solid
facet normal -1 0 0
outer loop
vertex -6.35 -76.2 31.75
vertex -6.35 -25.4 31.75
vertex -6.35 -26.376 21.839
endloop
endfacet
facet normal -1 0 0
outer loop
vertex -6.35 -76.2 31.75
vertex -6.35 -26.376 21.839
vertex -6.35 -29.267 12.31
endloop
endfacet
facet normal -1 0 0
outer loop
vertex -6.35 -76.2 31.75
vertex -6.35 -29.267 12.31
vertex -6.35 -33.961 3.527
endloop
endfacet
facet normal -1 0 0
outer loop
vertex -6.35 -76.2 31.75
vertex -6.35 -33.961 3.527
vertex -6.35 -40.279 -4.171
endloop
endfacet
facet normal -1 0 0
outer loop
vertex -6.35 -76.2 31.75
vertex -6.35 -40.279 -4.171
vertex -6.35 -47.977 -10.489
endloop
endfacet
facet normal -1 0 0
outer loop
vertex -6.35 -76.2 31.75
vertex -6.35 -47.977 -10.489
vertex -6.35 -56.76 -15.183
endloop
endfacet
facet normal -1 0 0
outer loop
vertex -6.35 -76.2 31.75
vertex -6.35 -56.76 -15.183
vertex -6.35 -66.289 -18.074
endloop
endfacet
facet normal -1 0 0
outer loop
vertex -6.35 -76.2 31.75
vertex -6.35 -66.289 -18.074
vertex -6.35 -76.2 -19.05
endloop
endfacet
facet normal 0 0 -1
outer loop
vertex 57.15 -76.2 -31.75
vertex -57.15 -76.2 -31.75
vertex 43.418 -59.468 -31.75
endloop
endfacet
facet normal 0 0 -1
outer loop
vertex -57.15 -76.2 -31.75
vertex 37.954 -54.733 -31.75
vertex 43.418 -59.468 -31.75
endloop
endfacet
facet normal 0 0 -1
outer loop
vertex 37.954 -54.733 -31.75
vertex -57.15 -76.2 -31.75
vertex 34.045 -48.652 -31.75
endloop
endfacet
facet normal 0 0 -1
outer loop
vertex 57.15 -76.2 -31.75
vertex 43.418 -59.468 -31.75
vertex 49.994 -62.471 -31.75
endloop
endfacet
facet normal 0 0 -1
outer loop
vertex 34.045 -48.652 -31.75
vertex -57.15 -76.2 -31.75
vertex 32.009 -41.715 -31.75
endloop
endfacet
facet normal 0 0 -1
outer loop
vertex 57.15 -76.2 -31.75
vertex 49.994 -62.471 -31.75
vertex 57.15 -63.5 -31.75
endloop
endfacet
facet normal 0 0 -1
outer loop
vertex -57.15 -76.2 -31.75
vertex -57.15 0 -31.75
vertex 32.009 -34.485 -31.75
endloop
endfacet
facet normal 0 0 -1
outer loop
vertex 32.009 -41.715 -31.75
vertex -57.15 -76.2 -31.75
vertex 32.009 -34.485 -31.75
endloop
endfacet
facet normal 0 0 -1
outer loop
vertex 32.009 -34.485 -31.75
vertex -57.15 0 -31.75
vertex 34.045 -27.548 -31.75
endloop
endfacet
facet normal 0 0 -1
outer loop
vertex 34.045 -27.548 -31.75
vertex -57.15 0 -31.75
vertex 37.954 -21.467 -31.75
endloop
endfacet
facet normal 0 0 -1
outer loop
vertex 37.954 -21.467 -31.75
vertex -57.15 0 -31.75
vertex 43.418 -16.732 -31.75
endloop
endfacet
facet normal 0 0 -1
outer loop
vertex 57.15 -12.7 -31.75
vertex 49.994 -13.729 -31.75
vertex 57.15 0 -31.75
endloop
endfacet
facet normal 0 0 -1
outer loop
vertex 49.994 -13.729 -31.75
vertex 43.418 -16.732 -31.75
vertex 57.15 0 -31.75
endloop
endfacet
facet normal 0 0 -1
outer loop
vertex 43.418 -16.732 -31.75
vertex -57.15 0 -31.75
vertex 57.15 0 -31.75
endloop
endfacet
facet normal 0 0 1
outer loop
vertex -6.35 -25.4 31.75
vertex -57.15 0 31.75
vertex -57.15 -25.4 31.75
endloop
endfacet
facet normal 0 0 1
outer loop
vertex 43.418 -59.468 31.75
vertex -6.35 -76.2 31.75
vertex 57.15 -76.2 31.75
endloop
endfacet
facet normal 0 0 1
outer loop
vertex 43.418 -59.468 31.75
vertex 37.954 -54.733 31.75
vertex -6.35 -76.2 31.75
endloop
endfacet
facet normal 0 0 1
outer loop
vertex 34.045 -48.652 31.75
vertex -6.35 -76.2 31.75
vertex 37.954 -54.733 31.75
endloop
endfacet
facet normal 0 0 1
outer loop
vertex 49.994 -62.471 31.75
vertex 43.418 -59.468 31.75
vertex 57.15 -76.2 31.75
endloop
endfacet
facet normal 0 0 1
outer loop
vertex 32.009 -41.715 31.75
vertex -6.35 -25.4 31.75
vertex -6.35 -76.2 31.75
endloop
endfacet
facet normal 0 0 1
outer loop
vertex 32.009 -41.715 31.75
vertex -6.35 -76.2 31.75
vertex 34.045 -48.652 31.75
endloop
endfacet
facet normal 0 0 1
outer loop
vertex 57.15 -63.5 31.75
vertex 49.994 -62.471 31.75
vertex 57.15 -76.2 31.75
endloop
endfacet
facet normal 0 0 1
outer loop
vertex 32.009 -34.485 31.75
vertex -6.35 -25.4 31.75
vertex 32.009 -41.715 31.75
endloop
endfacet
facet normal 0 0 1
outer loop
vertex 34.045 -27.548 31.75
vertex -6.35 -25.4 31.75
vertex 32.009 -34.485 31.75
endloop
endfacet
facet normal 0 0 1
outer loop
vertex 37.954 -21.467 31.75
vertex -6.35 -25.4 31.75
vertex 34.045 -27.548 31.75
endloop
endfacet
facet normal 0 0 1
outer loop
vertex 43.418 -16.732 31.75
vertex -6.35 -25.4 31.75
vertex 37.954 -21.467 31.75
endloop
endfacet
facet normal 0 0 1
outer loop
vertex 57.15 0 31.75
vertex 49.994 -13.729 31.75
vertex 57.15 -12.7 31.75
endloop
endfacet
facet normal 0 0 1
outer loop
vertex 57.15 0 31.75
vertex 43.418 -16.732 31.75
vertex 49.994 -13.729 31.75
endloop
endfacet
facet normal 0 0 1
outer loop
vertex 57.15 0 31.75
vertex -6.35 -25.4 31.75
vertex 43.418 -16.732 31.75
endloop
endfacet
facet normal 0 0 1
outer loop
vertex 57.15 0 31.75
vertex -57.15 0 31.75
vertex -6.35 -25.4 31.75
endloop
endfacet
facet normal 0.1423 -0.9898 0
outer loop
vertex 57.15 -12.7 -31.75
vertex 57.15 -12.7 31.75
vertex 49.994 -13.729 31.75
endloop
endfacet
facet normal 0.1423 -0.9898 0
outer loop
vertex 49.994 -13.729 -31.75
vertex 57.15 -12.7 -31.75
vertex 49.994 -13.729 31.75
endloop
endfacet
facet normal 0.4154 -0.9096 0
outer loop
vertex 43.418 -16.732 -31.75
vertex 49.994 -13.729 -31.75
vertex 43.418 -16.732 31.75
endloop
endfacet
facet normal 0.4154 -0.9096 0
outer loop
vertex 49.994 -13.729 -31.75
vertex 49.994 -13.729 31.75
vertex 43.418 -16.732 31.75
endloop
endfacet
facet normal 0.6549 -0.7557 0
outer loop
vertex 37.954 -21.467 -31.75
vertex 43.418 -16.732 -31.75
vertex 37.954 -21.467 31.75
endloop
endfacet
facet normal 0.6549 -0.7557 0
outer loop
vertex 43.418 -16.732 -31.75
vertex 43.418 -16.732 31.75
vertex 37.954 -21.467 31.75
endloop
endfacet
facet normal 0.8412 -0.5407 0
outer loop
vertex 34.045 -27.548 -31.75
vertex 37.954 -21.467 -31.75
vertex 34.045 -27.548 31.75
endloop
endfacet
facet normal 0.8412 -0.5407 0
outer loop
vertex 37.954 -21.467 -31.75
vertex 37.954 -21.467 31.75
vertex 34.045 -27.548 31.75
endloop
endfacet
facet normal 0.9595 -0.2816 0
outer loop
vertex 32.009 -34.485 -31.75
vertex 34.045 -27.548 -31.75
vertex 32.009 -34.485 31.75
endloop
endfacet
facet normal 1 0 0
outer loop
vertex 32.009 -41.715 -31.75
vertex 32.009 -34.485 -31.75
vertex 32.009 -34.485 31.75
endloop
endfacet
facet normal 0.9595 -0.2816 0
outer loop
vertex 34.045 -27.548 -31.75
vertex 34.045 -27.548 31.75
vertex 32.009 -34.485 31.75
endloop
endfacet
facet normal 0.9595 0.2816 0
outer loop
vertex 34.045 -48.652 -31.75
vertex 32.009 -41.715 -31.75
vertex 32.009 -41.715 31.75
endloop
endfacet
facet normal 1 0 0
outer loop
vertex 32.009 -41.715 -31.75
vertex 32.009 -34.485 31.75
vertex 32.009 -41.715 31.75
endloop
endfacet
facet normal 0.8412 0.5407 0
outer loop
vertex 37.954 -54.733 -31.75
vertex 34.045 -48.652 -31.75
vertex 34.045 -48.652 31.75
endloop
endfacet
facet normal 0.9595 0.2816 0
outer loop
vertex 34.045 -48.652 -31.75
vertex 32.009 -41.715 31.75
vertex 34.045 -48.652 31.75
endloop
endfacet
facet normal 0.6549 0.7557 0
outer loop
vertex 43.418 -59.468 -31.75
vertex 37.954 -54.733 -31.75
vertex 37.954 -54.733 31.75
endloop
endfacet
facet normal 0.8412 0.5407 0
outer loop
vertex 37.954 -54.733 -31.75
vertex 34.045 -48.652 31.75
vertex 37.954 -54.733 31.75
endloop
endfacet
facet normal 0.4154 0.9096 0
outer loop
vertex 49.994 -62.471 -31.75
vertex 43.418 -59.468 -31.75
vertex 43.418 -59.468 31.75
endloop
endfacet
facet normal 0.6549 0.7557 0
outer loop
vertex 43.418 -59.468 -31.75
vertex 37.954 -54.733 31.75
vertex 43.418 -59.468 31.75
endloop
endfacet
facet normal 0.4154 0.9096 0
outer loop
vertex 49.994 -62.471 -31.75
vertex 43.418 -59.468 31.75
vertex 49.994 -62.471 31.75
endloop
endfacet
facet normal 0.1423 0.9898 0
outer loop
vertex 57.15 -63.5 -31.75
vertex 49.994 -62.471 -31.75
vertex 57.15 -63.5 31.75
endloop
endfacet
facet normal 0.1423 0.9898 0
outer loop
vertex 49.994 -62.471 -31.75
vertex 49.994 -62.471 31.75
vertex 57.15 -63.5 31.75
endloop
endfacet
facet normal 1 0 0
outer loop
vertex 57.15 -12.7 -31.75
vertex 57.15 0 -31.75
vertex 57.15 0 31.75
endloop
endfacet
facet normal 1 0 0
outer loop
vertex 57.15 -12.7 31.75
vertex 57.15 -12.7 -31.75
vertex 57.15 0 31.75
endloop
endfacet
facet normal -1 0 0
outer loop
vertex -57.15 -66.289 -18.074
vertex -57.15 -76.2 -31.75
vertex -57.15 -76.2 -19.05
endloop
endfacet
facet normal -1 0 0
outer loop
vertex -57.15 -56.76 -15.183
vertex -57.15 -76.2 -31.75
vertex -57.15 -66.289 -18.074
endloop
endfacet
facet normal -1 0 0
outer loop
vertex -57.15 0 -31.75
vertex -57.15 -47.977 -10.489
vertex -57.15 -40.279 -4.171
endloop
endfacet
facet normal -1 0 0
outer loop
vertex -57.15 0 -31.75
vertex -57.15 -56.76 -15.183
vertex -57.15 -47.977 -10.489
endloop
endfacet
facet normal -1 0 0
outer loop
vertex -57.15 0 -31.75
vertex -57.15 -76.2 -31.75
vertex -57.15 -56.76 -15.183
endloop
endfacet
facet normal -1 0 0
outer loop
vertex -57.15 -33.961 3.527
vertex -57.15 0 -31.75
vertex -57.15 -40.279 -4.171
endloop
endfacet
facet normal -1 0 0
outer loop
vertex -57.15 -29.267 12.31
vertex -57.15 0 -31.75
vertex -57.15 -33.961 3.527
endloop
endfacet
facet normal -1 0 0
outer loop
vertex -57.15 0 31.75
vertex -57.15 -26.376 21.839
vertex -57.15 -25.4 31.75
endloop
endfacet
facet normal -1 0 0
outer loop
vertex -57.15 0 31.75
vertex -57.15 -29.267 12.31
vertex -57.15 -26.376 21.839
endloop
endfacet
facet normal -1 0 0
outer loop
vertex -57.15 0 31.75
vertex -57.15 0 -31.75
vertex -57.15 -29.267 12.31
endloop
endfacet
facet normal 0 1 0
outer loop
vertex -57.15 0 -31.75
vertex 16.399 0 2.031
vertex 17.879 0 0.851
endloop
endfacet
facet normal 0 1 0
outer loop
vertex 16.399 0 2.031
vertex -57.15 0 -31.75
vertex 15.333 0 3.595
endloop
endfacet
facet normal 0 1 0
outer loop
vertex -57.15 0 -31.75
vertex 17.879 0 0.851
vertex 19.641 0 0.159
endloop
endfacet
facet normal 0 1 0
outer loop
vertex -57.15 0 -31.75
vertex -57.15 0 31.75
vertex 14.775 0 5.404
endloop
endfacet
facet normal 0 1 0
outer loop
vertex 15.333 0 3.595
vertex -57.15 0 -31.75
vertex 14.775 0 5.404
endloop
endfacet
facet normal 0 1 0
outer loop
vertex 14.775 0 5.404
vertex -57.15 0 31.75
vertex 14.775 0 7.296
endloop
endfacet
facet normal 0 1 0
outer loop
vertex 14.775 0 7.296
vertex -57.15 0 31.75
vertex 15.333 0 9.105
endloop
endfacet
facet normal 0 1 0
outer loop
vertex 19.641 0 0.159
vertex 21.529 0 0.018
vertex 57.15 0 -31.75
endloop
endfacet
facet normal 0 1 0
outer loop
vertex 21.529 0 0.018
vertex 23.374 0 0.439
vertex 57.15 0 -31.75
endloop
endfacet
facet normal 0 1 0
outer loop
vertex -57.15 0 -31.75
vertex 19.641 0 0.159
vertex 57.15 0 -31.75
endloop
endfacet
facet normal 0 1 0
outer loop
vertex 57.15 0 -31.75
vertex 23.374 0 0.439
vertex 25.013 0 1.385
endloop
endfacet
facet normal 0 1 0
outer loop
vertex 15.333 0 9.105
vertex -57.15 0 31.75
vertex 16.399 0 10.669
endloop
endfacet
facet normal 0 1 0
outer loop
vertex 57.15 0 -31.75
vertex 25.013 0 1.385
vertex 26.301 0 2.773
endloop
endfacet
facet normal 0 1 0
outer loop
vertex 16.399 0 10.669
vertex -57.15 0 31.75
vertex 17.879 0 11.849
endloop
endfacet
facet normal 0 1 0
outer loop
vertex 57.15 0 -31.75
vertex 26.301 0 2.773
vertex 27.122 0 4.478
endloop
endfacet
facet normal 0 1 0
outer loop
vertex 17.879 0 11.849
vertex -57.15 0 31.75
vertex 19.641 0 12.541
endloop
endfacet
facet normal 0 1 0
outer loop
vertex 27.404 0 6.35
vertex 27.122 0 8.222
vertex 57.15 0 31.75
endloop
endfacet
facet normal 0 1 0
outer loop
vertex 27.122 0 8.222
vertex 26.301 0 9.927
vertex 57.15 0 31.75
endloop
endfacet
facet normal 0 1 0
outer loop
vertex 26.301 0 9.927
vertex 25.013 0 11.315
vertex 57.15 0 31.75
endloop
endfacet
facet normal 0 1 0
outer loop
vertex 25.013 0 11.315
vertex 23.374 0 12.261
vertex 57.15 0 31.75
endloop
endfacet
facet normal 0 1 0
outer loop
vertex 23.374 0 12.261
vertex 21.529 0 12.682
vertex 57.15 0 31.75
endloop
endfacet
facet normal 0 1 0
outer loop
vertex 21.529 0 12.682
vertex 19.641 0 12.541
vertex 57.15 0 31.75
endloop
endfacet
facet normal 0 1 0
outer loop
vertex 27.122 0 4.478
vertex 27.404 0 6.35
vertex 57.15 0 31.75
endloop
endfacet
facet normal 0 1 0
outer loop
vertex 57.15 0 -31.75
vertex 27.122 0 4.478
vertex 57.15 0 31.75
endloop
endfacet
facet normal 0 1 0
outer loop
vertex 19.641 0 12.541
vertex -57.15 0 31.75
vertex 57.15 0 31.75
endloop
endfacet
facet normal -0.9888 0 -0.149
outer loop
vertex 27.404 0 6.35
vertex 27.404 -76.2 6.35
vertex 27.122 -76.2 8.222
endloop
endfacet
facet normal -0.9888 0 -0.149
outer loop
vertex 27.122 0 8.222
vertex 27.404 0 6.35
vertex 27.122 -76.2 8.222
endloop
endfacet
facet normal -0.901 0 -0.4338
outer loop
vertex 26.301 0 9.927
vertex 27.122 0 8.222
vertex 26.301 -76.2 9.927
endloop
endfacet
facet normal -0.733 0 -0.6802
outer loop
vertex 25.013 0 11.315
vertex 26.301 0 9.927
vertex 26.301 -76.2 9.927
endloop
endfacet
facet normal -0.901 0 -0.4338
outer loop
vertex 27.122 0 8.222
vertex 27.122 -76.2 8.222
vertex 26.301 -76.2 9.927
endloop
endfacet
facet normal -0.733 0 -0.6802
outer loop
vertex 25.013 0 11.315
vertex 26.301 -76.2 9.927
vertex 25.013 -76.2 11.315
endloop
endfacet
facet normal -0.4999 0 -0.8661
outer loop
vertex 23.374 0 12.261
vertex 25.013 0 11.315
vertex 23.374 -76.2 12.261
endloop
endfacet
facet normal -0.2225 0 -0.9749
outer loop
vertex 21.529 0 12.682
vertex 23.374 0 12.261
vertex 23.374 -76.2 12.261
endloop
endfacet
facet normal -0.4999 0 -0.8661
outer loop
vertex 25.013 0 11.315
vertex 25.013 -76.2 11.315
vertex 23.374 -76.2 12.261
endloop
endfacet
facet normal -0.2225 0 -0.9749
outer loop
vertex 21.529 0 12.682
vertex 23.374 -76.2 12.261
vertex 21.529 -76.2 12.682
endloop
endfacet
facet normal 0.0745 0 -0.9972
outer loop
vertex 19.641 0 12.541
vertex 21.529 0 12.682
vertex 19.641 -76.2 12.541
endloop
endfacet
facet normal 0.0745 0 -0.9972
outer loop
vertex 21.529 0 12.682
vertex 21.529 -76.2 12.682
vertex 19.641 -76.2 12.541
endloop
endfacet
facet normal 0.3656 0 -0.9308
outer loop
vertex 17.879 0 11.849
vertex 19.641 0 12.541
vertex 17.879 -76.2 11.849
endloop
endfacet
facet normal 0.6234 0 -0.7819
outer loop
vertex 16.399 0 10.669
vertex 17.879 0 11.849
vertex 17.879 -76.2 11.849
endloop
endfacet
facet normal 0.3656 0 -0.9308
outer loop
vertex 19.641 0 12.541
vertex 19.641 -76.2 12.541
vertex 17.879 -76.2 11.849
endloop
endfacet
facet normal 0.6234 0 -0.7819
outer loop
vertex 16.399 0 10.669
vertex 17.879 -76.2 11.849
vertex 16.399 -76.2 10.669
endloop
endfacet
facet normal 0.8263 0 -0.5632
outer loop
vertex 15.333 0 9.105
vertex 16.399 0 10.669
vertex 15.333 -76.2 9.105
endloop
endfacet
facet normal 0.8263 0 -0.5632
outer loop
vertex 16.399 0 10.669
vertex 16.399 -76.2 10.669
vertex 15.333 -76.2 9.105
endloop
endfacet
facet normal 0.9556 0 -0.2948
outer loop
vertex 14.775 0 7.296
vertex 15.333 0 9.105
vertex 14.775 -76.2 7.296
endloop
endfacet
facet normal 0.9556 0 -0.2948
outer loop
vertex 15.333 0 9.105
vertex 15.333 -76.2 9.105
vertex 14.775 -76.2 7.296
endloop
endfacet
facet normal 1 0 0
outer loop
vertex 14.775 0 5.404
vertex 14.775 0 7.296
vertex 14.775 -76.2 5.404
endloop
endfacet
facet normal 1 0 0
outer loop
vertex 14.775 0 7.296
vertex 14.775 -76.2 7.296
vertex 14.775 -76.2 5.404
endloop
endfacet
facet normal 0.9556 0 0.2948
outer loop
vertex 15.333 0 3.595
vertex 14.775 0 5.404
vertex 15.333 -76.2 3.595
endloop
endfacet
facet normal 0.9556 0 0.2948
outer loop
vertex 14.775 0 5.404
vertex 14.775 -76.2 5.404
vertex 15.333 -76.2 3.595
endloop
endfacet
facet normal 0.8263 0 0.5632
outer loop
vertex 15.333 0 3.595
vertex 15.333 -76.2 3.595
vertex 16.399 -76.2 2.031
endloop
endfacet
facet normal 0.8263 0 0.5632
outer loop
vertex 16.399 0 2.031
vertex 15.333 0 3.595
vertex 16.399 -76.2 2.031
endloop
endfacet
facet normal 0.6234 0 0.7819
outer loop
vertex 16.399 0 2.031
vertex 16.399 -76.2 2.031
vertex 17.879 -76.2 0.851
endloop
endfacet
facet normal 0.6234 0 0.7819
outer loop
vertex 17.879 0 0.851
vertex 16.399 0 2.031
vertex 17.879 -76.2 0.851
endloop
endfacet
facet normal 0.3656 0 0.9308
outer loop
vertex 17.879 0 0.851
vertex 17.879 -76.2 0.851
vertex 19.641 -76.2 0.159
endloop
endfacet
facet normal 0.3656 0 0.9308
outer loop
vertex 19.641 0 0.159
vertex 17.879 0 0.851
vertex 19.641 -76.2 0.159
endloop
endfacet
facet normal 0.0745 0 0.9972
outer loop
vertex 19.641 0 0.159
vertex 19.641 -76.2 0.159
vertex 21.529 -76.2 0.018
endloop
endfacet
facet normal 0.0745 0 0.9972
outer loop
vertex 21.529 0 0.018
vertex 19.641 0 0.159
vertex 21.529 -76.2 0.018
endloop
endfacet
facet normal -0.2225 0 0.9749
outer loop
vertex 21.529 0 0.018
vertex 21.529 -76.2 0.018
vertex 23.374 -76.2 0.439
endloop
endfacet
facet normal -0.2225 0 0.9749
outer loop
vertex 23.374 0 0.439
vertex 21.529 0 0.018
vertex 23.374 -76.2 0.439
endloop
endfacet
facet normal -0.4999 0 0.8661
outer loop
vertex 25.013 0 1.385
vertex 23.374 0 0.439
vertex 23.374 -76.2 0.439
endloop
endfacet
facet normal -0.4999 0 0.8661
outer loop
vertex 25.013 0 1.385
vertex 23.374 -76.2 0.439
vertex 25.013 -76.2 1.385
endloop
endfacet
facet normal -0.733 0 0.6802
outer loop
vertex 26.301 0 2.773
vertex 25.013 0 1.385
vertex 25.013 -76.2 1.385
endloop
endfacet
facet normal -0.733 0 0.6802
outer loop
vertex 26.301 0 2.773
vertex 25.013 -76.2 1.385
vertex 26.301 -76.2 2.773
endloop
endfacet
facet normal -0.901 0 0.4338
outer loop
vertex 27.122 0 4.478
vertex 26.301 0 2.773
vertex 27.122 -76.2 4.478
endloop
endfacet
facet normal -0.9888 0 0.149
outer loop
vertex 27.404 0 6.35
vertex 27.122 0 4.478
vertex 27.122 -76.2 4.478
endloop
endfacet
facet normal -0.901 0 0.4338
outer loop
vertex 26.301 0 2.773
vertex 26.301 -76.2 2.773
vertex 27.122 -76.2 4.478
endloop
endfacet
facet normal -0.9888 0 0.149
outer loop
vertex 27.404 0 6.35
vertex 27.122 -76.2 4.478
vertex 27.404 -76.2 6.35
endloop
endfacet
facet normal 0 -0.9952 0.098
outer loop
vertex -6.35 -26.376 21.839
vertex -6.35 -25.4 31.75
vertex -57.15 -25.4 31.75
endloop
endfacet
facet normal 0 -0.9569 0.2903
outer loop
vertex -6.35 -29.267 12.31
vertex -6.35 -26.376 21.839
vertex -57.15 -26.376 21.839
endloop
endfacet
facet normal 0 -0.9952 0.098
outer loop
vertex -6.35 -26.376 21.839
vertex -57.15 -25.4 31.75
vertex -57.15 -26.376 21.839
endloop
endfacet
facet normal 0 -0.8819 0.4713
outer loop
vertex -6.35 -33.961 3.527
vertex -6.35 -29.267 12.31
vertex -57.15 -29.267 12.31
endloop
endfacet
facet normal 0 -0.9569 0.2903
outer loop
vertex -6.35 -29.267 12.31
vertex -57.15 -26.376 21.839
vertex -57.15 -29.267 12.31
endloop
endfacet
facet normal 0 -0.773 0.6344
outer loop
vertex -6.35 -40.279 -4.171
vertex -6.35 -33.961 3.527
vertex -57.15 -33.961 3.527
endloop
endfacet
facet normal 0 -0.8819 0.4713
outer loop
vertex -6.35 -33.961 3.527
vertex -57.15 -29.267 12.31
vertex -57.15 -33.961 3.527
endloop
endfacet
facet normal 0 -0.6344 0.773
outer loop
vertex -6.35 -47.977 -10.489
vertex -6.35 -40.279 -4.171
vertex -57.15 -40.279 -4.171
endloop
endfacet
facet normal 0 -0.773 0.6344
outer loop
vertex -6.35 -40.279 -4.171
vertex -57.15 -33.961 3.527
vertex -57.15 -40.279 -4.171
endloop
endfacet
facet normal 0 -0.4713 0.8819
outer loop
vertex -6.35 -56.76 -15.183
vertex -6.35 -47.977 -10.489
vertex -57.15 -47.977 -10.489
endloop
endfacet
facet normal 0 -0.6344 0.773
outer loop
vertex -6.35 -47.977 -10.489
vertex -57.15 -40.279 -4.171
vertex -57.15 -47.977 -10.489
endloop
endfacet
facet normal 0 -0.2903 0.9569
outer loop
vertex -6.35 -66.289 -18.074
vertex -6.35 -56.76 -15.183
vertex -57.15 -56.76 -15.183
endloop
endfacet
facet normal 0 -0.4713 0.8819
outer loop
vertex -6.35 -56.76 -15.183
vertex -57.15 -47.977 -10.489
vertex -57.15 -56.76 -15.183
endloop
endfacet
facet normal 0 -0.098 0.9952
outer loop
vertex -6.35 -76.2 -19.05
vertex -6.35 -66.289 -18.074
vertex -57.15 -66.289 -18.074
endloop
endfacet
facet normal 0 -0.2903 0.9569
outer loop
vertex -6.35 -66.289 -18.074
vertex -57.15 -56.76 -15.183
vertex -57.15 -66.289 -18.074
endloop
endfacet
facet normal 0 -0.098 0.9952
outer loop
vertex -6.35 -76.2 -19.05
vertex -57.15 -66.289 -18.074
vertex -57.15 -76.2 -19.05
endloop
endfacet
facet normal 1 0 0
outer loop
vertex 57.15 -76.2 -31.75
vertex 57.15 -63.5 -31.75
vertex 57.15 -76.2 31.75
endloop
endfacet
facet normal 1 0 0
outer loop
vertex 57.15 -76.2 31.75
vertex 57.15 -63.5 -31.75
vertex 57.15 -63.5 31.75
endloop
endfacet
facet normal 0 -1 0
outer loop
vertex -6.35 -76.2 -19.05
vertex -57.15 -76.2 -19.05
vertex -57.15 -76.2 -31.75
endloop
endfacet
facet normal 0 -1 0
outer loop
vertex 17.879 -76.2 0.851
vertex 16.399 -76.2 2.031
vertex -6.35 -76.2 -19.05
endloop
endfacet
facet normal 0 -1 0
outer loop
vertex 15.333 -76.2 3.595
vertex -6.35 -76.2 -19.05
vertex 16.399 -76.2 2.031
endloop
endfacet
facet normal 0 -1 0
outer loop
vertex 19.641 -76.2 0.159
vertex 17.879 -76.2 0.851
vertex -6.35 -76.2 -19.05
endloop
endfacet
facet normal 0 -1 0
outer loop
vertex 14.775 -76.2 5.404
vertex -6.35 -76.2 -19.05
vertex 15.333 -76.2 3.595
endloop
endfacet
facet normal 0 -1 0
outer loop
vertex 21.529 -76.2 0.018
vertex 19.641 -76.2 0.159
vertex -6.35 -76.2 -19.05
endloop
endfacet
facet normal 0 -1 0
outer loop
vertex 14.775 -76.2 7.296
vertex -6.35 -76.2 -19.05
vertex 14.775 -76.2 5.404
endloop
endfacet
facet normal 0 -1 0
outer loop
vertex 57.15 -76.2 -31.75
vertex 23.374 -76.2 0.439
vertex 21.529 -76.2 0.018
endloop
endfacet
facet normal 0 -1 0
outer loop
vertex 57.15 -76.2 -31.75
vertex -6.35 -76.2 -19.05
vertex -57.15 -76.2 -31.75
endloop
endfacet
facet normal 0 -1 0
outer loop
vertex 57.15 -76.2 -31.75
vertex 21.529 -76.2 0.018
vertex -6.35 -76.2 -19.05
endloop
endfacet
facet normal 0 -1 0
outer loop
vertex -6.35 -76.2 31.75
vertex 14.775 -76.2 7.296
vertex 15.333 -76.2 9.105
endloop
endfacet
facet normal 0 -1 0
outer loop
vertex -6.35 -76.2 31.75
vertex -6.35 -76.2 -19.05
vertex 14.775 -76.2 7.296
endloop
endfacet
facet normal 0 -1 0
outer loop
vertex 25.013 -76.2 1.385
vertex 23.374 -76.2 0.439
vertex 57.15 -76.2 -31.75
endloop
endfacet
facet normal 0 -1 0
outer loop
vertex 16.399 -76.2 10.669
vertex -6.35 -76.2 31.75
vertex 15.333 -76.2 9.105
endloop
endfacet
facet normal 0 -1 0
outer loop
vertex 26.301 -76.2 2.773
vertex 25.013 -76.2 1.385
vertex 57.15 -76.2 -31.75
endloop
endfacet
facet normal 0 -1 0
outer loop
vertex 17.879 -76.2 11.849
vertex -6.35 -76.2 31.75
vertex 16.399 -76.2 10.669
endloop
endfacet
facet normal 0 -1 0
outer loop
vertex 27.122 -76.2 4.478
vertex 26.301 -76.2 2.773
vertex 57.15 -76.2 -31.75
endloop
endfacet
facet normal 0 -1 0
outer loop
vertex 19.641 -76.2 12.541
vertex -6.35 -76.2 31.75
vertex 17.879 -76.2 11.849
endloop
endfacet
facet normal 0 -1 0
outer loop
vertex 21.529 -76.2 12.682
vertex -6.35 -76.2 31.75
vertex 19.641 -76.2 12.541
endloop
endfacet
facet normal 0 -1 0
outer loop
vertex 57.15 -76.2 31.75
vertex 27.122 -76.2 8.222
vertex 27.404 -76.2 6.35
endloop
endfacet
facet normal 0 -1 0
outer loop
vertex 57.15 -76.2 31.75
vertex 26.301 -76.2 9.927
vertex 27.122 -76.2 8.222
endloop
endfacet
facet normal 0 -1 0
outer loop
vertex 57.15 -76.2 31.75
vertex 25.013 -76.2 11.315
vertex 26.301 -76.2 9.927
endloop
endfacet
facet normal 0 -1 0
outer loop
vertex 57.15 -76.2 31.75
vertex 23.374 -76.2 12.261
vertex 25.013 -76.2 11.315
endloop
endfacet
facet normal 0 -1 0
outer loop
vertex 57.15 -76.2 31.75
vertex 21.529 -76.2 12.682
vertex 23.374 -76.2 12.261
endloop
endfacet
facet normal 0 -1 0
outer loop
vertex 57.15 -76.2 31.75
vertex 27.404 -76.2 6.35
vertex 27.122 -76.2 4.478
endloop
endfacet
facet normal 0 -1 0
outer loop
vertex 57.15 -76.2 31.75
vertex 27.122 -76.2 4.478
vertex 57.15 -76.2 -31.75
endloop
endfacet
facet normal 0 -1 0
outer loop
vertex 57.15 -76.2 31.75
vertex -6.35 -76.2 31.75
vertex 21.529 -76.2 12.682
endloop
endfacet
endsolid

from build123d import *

# Parameters (mm, degrees)
F0_W     = 114.3
F0_H     = 63.5
F1_DEPTH = 76.2
F2_R     = 50.8
F3_DEPTH = 50.8
F4_R     = 6.35
F5_DEPTH = 76.2
F6_R     = 25.4
F7_DEPTH = 87.376


with BuildPart() as f1:
    # F0 (on Front) → F1 (new body)
    with BuildSketch(Plane.XZ):
        Rectangle(F0_W, F0_H)
    extrude(amount=F1_DEPTH)

    # F2 (on face) → F3 (cut)
    with BuildSketch(Plane(origin=(-57.15, 0, 0), x_dir=(0, -1, 0), z_dir=(-1, 0, 0))):
        with Locations((76.2, 31.75)):
            Circle(F2_R)
    extrude(amount=-F3_DEPTH, mode=Mode.SUBTRACT)

    # F4 (on face) → F5 (cut)
    with BuildSketch(Plane.XZ.offset(76.2)):
        with Locations((21.054188, 6.35)):
            Circle(F4_R)
    extrude(amount=-F5_DEPTH, mode=Mode.SUBTRACT)

    # F6 (on face) → F7 (cut)
    with BuildSketch(Plane.XY.offset(31.75)):
        with Locations((57.15, -38.1)):
            Circle(F6_R)
    extrude(amount=-F7_DEPTH, mode=Mode.SUBTRACT)


solid = f1.part
